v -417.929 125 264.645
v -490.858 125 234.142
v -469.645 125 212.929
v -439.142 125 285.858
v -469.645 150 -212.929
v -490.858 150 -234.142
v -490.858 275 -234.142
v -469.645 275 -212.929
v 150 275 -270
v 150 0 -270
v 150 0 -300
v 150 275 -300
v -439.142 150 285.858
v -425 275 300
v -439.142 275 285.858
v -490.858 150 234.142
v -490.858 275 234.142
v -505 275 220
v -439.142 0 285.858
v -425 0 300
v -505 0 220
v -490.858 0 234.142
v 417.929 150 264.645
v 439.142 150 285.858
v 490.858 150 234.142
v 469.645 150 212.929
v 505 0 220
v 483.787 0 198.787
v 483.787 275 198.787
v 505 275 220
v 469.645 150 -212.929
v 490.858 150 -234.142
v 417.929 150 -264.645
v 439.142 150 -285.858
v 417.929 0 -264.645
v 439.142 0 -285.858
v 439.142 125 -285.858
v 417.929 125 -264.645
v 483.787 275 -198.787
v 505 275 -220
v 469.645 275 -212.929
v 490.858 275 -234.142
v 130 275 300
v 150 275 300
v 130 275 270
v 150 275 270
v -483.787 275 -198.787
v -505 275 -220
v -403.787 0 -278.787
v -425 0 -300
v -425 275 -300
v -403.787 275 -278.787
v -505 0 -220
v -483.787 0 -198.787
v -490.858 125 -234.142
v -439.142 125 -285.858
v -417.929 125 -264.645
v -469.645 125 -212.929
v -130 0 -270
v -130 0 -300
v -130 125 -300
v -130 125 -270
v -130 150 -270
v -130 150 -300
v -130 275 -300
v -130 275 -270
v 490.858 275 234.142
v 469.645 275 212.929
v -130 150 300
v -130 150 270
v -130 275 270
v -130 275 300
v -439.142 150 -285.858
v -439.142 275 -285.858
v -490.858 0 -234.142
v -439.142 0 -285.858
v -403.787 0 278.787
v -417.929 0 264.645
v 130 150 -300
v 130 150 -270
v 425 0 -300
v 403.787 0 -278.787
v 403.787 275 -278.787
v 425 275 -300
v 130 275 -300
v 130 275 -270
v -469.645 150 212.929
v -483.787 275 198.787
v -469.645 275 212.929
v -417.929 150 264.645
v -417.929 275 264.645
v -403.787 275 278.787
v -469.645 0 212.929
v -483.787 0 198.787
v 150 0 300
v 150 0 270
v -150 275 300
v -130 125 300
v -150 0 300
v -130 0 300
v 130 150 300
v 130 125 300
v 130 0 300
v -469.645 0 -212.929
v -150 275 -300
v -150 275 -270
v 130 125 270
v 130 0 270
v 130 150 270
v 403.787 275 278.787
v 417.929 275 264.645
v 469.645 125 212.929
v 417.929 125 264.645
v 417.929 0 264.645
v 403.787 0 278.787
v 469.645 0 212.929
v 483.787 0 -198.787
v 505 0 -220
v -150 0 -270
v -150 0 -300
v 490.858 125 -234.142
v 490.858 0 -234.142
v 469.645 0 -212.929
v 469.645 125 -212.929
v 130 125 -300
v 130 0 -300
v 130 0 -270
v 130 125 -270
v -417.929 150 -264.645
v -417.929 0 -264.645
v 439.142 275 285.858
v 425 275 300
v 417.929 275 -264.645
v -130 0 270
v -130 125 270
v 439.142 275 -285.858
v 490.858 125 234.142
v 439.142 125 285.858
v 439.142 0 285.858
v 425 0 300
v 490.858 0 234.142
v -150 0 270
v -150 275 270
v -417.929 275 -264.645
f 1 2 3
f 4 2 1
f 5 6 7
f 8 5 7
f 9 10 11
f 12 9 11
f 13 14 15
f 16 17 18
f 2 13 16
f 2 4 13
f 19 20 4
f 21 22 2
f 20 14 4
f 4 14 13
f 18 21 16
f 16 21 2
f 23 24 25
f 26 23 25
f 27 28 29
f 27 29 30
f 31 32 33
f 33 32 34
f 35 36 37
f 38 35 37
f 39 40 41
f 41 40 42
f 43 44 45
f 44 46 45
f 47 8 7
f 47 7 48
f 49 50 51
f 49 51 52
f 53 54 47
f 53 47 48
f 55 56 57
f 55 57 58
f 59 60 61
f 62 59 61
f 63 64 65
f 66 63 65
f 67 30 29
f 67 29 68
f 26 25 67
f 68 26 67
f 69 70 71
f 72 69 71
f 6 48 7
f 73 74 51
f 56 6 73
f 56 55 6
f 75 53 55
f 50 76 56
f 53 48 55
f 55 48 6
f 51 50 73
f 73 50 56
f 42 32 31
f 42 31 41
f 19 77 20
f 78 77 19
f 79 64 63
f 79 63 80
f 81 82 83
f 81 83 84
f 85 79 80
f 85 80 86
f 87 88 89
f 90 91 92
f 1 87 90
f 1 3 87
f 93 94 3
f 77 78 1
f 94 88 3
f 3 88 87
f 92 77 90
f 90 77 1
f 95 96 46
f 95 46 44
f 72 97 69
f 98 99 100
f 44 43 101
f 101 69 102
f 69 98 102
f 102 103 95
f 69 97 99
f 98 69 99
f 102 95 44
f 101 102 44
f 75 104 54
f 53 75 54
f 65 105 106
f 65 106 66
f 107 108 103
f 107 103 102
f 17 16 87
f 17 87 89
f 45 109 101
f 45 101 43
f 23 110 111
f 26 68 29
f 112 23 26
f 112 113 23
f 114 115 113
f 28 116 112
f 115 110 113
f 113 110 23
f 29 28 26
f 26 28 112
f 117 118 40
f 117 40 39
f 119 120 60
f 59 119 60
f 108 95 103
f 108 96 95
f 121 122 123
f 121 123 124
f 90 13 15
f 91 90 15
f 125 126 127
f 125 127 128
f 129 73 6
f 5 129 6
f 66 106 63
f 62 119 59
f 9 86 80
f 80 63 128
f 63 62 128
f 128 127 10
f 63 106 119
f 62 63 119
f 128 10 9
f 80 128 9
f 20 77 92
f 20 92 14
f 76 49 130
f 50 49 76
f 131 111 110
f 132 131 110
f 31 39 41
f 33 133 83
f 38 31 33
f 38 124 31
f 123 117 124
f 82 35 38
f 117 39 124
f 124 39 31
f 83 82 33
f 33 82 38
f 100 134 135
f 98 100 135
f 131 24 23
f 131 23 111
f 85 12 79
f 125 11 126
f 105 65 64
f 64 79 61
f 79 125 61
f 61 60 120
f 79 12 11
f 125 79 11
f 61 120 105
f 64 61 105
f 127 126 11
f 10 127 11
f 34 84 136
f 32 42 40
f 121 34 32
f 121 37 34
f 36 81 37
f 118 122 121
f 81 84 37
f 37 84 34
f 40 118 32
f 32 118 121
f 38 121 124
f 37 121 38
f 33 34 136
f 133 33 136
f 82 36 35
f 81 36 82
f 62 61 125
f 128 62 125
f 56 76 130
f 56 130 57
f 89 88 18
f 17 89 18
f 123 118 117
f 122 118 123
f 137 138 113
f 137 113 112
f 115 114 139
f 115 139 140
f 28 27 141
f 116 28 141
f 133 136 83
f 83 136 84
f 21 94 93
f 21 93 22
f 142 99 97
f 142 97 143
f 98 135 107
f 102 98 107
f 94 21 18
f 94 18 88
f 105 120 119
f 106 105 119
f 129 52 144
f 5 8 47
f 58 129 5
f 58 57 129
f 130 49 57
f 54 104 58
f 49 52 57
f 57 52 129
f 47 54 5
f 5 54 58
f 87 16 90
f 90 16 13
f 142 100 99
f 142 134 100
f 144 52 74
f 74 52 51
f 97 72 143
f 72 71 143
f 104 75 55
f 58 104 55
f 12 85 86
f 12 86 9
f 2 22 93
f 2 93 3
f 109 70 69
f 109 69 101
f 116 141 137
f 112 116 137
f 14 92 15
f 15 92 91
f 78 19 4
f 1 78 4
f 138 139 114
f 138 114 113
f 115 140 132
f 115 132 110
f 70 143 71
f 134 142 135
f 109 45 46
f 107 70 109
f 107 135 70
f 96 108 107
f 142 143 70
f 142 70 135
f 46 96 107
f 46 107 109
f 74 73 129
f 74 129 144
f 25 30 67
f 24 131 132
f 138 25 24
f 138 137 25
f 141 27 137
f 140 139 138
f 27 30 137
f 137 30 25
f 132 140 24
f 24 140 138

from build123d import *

# Parameters (mm, degrees)
EXTRUDE_1_DEPTH          = 275
EXTRUDE_1_2_DEPTH        = 275
EXTRUDE_1_3_DEPTH        = 275
EXTRUDE_1_4_DEPTH        = 275
EXTRUDE_1_5_DEPTH        = 275
EXTRUDE_1_6_DEPTH        = 275
CUT_EXTRUDE_1_DEPTH      = 832.053548215
CUT_EXTRUDE_1_DEPTH_BACK = 832.053548215
SKETCH_2_W               = 260
SKETCH_2_H               = 125
SKETCH_3_W               = 73.13708499
SKETCH_3_H               = 125
CUT_EXTRUDE_2_DEPTH      = 30
SKETCH_4_W               = 73.13708499
SKETCH_4_H               = 125
CUT_EXTRUDE_3_DEPTH      = 30
SKETCH_5_W               = 73.13708499
SKETCH_5_H               = 125
CUT_EXTRUDE_4_DEPTH      = 30
SKETCH_6_W               = 73.13708499
SKETCH_6_H               = 125
CUT_EXTRUDE_5_DEPTH      = 30


with BuildPart() as part:
    # 草图1 → 凸台-拉伸1 (new body)
    with BuildSketch(Plane(origin=(0, 0, 0), x_dir=(1, 0, 0), z_dir=(0, 1, 0))):
        Polygon((-505, 220), (-425, 300), (-403.786796564, 278.786796564), (-483.786796564, 198.786796564), align=None)
    extrude(amount=EXTRUDE_1_DEPTH)

    # 草图5 → 切除-拉伸4 (cut)
    with BuildSketch(Plane(origin=(-362.5, 0, -362.5), x_dir=(-0.7071067811865475, 0, 0.7071067811865477), z_dir=(-0.7071067811865477, 0, -0.7071067811865475))):
        with Locations((144.956890143, 212.5)):
            Rectangle(SKETCH_5_W, SKETCH_5_H)
        with Locations((144.956890143, 62.5)):
            Rectangle(SKETCH_5_W, SKETCH_5_H)
    extrude(amount=-CUT_EXTRUDE_4_DEPTH, mode=Mode.SUBTRACT)


with BuildPart() as body_2:
    # 草图1 → Extrude 1 2 (new body)
    with BuildSketch(Plane(origin=(0, 0, 0), x_dir=(1, 0, 0), z_dir=(0, 1, 0))):
        Polygon((-150, 270), (150, 270), (150, 300), (0, 300), (-150, 300), align=None)
    extrude(amount=EXTRUDE_1_2_DEPTH)


with BuildPart() as body_3:
    # 草图1 → Extrude 1 3 (new body)
    with BuildSketch(Plane(origin=(0, 0, 0), x_dir=(1, 0, 0), z_dir=(0, 1, 0))):
        Polygon((505, 220), (483.786796564, 198.786796564), (403.786796564, 278.786796564), (425, 300), align=None)
    extrude(amount=EXTRUDE_1_3_DEPTH)

    # 草图4 → 切除-拉伸3 (cut)
    with BuildSketch(Plane(origin=(362.5, 0, -362.5), x_dir=(-0.7071067811865475, 0, -0.7071067811865477), z_dir=(0.7071067811865477, 0, -0.7071067811865475))):
        with Locations((-144.956890143, 212.5)):
            Rectangle(SKETCH_4_W, SKETCH_4_H)
        with Locations((-144.956890143, 62.5)):
            Rectangle(SKETCH_4_W, SKETCH_4_H)
    extrude(amount=-CUT_EXTRUDE_3_DEPTH, mode=Mode.SUBTRACT)


with BuildPart() as body_4:
    # 草图1 → Extrude 1 4 (new body)
    with BuildSketch(Plane(origin=(0, 0, 0), x_dir=(1, 0, 0), z_dir=(0, 1, 0))):
        Polygon((505, -220), (425, -300), (403.786796564, -278.786796564), (483.786796564, -198.786796564), align=None)
    extrude(amount=EXTRUDE_1_4_DEPTH)

    # 草图3 → 切除-拉伸2 (cut)
    with BuildSketch(Plane(origin=(362.5, 0, 362.5), x_dir=(0.7071067811865475, 0, -0.7071067811865477), z_dir=(0.7071067811865477, 0, 0.7071067811865475))):
        with Locations((144.956890143, 212.5)):
            Rectangle(SKETCH_3_W, SKETCH_3_H)
        with Locations((144.956890143, 62.5)):
            Rectangle(SKETCH_3_W, SKETCH_3_H)
    extrude(amount=-CUT_EXTRUDE_2_DEPTH, mode=Mode.SUBTRACT)


with BuildPart() as body_5:
    # 草图1 → Extrude 1 5 (new body)
    with BuildSketch(Plane(origin=(0, 0, 0), x_dir=(1, 0, 0), z_dir=(0, 1, 0))):
        Polygon((-150, -300), (-150, -270), (150, -270), (150, -300), (0, -300), align=None)
    extrude(amount=EXTRUDE_1_5_DEPTH)


with BuildPart() as body_6:
    # 草图1 → Extrude 1 6 (new body)
    with BuildSketch(Plane(origin=(0, 0, 0), x_dir=(1, 0, 0), z_dir=(0, 1, 0))):
        Polygon((-505, -220), (-483.786796564, -198.786796564), (-403.786796564, -278.786796564), (-425, -300), align=None)
    extrude(amount=EXTRUDE_1_6_DEPTH)

    # 草图6 → 切除-拉伸5 (cut)
    with BuildSketch(Plane(origin=(-362.5, 0, 362.5), x_dir=(0.7071067811865475, 0, 0.7071067811865477), z_dir=(-0.7071067811865477, 0, 0.7071067811865475))):
        with Locations((-144.956890143, 212.5)):
            Rectangle(SKETCH_6_W, SKETCH_6_H)
        with Locations((-144.956890143, 62.5)):
            Rectangle(SKETCH_6_W, SKETCH_6_H)
    extrude(amount=-CUT_EXTRUDE_5_DEPTH, mode=Mode.SUBTRACT)


with BuildPart() as cut_extrude_1_tool:
    # 草图2 → 切除-拉伸1 (new, two sides: drawn at the far end of the back side and taken through both)
    with BuildSketch(Plane.XY.offset(300).offset(-CUT_EXTRUDE_1_DEPTH_BACK)):
        with Locations((0, 212.5)):
            Rectangle(SKETCH_2_W, SKETCH_2_H)
        with Locations((0, 62.5)):
            Rectangle(SKETCH_2_W, SKETCH_2_H)
    extrude(amount=CUT_EXTRUDE_1_DEPTH + CUT_EXTRUDE_1_DEPTH_BACK)


with BuildPart() as body_2_1:
    add(body_2.part)

    # 切除-拉伸1: cut by cut_extrude_1_tool
    add(cut_extrude_1_tool.part, mode=Mode.SUBTRACT)


with BuildPart() as body_5_1:
    add(body_5.part)

    # 切除-拉伸1: cut by cut_extrude_1_tool
    add(cut_extrude_1_tool.part, mode=Mode.SUBTRACT)


solid = Compound([part.part, body_3.part, body_4.part, body_6.part, body_2_1.part, body_5_1.part])
